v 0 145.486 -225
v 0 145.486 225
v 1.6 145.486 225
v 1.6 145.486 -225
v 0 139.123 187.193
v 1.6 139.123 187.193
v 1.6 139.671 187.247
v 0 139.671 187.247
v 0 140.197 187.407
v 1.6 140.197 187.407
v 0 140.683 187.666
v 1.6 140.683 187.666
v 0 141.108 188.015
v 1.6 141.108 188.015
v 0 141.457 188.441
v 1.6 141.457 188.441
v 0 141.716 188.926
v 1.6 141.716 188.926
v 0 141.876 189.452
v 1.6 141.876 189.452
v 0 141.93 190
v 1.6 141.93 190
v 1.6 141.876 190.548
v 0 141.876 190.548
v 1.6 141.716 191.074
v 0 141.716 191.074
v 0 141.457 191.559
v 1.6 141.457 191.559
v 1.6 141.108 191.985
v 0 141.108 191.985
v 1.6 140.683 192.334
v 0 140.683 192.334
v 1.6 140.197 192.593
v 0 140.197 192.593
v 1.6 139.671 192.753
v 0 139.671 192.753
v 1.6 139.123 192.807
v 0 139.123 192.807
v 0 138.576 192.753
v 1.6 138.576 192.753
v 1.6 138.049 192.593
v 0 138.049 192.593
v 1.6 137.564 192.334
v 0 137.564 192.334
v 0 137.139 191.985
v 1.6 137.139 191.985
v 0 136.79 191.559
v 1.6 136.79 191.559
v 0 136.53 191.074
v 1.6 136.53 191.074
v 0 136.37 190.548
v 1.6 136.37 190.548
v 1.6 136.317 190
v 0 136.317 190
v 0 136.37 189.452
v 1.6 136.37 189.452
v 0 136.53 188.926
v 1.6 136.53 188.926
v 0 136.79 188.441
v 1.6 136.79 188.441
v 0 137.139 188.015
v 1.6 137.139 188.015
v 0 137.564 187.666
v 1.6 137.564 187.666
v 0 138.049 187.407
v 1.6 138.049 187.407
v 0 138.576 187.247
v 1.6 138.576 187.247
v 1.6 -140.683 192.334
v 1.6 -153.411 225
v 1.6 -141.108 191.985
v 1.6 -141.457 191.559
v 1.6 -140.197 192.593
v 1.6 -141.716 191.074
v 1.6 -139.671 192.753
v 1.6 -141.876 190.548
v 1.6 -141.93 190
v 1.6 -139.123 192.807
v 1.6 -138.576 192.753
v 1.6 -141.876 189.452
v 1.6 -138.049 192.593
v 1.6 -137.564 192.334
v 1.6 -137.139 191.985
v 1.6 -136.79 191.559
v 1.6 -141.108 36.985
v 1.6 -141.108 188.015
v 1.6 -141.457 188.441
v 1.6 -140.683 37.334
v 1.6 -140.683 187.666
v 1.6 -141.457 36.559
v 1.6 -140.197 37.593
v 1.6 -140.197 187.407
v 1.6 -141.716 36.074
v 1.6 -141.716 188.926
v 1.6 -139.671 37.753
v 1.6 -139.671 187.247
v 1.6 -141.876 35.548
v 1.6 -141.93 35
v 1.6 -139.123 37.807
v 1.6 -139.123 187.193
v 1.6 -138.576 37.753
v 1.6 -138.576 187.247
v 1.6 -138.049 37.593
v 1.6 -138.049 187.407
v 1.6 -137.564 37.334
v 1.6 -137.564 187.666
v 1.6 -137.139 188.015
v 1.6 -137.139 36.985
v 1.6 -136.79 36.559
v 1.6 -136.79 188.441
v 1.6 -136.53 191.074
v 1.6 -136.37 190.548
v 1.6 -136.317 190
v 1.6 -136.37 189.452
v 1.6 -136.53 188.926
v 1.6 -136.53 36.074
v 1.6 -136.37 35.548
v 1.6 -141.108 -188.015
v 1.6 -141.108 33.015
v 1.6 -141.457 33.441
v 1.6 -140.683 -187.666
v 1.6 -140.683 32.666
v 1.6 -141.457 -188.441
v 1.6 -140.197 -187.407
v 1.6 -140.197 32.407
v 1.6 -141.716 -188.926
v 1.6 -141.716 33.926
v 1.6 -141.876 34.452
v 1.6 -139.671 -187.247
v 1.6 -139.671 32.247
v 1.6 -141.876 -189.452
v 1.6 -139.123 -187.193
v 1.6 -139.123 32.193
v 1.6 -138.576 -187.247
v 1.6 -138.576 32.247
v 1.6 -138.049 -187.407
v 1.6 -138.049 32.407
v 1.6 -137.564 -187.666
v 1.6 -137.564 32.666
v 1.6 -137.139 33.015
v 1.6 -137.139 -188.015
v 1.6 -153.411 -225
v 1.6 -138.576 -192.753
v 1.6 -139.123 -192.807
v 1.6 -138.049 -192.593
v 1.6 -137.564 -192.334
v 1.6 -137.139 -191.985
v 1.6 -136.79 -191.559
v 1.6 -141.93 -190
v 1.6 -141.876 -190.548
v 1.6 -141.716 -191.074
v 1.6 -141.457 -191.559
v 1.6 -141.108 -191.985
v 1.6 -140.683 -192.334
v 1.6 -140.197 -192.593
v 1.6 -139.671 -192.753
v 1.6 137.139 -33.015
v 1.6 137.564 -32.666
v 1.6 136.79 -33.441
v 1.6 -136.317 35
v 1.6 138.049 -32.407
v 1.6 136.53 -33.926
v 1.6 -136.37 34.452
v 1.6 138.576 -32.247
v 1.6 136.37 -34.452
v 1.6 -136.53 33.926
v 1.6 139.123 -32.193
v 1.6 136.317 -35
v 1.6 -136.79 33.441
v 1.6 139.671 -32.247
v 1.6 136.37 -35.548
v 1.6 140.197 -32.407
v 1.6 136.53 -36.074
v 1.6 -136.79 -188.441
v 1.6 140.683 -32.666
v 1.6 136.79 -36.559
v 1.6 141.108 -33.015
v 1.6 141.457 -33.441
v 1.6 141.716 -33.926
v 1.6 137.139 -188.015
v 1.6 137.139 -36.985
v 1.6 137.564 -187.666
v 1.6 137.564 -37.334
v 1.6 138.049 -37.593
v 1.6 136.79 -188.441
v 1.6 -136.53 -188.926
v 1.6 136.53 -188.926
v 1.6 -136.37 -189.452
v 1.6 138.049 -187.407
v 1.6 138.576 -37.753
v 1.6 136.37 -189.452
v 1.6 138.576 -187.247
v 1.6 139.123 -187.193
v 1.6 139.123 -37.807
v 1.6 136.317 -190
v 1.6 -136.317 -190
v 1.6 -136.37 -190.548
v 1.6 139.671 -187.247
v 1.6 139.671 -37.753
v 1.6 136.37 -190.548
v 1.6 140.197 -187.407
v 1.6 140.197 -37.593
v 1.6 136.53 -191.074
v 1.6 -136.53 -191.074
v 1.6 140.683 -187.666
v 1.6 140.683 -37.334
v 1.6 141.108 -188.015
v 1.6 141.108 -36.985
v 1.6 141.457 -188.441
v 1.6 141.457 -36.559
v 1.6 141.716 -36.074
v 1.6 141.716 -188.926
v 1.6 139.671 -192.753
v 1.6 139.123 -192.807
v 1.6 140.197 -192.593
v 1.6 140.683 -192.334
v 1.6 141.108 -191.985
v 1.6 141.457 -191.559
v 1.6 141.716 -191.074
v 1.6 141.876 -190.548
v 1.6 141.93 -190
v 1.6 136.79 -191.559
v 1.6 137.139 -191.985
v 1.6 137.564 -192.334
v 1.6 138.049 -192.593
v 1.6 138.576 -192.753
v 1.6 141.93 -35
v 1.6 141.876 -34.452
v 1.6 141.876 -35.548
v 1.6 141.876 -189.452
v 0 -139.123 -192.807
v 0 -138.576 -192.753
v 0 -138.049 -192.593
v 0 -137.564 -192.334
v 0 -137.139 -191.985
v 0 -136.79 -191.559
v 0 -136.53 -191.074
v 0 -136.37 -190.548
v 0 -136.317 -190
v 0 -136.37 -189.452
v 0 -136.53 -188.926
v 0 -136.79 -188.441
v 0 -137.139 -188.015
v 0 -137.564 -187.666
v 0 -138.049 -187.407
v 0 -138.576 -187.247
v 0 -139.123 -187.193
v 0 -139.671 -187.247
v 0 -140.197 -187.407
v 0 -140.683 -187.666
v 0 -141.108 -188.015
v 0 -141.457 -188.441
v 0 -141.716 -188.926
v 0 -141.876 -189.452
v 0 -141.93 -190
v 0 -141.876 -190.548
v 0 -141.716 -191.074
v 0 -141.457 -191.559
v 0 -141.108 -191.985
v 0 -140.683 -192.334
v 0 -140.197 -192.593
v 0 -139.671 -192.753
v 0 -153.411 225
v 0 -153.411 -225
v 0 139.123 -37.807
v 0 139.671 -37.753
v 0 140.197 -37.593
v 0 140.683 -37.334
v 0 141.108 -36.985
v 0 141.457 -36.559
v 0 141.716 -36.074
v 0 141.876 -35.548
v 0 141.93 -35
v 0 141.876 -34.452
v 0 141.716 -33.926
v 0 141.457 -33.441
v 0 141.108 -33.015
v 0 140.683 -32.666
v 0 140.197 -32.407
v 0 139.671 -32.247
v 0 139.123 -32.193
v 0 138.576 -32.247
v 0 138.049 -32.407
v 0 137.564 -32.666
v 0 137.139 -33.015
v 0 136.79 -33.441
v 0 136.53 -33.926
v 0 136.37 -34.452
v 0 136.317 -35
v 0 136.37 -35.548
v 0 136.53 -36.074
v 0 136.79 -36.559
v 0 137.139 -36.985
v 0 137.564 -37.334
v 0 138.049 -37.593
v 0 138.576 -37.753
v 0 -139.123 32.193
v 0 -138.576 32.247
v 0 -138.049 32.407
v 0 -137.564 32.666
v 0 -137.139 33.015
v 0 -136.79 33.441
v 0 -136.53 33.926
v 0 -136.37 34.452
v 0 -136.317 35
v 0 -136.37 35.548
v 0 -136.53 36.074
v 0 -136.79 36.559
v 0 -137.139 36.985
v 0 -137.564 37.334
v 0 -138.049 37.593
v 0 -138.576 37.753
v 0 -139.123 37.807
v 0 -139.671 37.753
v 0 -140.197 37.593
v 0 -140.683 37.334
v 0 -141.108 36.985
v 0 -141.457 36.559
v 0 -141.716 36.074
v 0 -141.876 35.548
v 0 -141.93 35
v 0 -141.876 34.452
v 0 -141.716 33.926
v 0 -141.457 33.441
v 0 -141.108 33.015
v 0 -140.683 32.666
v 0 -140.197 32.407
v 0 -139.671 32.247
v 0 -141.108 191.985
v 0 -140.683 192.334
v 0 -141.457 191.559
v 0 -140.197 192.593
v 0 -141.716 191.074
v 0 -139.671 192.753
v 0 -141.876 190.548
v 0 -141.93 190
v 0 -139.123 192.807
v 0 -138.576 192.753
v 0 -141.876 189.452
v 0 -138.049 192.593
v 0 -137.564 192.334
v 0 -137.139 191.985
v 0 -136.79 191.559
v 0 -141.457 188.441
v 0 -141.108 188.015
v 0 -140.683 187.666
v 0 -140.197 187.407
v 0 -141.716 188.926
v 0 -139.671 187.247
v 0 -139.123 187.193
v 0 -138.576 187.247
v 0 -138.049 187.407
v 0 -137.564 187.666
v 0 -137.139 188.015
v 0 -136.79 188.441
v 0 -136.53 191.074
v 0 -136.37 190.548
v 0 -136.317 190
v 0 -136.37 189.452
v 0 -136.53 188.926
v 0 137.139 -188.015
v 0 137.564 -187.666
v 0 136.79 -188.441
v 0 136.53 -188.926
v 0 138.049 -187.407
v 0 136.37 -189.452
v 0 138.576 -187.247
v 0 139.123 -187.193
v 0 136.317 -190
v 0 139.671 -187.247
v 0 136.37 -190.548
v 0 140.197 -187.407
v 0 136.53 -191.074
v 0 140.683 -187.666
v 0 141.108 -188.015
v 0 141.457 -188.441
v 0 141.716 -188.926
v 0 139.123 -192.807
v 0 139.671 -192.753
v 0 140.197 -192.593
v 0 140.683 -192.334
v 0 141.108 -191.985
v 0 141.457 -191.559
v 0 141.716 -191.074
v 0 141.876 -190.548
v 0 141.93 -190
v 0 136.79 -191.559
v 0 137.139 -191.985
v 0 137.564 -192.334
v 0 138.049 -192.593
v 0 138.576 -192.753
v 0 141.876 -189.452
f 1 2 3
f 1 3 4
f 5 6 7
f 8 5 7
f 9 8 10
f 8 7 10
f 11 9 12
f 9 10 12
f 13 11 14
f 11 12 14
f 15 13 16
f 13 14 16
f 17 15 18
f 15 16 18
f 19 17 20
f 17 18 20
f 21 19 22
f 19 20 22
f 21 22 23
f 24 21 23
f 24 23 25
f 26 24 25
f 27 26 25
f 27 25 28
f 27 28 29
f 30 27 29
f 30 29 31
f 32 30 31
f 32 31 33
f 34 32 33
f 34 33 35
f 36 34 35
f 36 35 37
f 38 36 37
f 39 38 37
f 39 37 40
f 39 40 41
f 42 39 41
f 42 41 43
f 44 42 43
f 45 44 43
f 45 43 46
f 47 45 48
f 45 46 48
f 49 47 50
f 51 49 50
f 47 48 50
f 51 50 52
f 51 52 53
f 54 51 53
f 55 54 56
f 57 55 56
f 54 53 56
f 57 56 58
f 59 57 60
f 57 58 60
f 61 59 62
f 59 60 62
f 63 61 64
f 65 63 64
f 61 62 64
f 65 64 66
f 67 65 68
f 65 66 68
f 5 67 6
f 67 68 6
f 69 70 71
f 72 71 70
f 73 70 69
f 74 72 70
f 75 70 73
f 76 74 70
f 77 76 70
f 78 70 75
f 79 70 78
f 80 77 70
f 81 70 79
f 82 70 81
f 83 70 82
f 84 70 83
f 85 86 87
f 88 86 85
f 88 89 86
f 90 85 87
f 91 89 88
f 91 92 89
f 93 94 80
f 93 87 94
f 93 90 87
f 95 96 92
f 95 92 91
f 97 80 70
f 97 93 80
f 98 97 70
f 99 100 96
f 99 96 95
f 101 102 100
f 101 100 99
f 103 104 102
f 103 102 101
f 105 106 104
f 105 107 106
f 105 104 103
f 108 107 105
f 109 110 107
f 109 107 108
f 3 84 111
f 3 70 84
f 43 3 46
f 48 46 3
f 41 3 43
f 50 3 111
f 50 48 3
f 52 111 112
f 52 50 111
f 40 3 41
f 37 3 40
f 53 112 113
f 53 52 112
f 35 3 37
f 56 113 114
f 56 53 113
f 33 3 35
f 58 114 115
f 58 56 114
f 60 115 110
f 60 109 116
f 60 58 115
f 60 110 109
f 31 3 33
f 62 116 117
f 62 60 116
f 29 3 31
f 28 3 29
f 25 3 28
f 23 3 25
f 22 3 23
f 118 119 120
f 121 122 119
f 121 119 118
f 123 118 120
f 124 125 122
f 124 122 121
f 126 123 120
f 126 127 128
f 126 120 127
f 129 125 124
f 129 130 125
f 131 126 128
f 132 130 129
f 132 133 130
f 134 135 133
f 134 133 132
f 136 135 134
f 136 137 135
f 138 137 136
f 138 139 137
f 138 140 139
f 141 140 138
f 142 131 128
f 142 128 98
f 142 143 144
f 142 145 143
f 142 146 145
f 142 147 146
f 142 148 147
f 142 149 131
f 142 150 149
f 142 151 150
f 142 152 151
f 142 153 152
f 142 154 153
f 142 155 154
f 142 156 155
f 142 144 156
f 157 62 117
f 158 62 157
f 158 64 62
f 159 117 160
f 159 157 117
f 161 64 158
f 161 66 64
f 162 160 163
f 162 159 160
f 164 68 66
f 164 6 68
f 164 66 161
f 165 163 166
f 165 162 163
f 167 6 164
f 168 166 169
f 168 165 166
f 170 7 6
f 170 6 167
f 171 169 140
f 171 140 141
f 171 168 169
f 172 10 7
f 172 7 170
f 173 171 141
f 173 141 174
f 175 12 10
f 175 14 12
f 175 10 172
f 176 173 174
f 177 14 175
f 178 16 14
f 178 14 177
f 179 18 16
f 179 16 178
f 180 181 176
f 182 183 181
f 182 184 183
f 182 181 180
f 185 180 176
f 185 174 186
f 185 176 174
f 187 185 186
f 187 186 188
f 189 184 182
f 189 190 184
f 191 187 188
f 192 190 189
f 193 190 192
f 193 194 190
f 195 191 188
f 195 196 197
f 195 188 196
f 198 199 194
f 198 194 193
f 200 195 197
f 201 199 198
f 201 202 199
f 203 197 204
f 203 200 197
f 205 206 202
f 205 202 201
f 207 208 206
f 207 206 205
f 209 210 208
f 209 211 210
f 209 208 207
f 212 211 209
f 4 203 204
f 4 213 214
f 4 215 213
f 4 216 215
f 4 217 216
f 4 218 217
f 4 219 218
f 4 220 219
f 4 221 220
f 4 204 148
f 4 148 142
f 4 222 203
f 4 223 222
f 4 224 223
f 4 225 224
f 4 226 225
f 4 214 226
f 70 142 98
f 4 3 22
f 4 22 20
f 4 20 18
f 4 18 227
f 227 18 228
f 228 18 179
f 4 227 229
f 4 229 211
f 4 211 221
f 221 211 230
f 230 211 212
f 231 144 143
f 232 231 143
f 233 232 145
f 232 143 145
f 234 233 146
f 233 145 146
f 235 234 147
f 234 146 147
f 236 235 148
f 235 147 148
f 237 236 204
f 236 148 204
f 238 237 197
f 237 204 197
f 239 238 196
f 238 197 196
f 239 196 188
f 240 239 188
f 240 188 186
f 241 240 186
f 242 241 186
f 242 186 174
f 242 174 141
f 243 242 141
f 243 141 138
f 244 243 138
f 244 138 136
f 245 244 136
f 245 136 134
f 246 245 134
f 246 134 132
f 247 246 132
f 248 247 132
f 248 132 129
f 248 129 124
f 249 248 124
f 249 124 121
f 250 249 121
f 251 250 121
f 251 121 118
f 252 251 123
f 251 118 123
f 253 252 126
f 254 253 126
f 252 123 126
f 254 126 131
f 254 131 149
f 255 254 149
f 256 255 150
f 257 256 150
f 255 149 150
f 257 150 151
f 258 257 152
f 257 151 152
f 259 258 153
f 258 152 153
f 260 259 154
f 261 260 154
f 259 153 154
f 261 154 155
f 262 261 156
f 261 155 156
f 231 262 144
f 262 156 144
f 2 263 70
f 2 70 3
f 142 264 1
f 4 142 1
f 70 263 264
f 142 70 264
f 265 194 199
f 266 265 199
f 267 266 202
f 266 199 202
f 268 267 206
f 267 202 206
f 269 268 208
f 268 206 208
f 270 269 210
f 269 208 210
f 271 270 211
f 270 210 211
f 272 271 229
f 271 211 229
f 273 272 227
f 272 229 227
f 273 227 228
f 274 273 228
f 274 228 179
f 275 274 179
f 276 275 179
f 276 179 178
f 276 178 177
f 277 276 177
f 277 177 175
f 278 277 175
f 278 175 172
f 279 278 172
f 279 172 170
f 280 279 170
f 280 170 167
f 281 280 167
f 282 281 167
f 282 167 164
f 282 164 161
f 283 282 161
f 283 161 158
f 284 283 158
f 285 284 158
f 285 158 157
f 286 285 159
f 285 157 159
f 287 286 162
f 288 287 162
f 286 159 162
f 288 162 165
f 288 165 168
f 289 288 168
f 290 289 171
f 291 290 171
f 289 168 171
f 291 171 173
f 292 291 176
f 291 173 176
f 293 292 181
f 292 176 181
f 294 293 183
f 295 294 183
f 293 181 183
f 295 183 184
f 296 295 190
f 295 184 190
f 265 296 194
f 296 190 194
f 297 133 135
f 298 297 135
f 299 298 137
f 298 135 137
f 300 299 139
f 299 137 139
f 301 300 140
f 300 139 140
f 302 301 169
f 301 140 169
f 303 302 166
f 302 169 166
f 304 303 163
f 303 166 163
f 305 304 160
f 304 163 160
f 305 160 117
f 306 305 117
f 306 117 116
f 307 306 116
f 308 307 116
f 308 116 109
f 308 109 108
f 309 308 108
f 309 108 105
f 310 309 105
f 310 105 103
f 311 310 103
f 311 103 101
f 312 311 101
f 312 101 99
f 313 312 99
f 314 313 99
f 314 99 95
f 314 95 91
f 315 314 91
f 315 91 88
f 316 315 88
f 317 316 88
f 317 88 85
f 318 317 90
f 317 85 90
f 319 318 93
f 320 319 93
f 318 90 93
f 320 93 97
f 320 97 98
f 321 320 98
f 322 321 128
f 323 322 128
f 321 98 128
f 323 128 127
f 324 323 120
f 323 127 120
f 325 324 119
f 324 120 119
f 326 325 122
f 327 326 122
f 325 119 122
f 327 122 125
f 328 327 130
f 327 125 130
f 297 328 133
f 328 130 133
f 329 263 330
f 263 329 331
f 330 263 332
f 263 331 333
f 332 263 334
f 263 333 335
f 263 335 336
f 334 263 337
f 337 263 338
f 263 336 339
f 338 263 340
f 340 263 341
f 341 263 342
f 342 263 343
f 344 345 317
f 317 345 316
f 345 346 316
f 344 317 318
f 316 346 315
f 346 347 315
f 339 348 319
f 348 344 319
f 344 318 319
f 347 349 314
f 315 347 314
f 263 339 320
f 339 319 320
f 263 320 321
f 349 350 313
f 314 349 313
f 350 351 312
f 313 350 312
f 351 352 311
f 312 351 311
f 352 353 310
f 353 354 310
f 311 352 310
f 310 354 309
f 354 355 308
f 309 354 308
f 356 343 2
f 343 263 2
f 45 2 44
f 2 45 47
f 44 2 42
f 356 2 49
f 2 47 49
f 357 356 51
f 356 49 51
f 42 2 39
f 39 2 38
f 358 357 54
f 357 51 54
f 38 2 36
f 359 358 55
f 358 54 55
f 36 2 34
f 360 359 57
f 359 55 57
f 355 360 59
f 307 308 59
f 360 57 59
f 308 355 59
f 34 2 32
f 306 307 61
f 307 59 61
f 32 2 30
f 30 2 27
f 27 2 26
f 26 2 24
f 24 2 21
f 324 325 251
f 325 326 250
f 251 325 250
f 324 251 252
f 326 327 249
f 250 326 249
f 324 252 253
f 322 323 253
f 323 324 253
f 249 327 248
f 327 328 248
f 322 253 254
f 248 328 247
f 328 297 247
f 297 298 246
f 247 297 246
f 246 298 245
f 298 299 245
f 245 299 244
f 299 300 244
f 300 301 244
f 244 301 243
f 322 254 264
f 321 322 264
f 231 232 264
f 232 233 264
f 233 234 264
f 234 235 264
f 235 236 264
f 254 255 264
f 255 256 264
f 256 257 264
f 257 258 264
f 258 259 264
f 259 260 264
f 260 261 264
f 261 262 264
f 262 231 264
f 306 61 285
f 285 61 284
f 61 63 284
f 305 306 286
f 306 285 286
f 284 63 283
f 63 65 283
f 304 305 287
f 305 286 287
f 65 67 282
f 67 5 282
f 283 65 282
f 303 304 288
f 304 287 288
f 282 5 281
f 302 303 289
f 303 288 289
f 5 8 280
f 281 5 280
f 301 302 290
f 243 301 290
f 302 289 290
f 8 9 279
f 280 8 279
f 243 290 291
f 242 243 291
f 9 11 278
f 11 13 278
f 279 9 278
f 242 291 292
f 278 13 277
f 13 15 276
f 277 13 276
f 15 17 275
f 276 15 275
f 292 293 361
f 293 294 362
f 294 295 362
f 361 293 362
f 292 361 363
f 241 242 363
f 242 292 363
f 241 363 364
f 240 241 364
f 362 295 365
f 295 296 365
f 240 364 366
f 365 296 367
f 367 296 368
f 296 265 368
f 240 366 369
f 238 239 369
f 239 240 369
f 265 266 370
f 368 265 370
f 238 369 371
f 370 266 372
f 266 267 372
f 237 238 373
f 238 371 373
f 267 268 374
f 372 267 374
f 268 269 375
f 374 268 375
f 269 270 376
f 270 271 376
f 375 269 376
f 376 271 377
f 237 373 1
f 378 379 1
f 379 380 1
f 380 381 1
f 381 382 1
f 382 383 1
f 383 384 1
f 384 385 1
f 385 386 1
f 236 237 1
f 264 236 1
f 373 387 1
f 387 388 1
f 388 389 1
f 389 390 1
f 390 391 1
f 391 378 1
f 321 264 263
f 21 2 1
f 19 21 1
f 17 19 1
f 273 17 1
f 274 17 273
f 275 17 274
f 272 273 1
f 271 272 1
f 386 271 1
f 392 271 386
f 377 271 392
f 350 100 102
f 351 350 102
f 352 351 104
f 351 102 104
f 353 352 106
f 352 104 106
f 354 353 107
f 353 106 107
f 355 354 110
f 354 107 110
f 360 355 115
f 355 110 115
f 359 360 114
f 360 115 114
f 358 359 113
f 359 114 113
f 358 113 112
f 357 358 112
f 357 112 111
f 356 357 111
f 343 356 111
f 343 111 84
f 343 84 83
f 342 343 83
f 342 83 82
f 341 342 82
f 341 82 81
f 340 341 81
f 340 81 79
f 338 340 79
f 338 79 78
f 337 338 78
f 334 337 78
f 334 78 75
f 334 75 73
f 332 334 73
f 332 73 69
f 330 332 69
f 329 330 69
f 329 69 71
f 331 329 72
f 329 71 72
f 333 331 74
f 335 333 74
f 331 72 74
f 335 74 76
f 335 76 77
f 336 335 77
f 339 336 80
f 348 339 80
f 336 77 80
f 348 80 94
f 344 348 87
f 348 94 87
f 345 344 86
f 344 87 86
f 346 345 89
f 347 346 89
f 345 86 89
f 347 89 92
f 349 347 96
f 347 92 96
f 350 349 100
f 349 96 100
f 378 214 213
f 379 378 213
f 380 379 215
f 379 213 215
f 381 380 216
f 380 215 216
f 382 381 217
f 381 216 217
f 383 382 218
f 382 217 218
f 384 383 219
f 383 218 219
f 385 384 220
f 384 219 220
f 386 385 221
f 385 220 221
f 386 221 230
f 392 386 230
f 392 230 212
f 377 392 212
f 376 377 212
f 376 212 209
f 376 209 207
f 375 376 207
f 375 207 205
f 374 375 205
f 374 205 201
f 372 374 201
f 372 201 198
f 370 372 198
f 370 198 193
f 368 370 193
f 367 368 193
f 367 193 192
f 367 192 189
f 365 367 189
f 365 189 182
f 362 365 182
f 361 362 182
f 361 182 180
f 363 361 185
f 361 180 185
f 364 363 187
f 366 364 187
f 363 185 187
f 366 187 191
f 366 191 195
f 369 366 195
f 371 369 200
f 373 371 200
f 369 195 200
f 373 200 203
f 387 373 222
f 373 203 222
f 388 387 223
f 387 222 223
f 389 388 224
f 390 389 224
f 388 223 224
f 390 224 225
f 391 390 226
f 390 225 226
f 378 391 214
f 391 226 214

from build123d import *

# Parameters (mm, degrees)
SKETCH2_W                  = 450
SKETCH2_H                  = 298.8966167
BOSS_EXTRUDE1_DEPTH        = 1.6002
F_10_CLEARANCE_HOLE1_D     = 5.6134
F_10_CLEARANCE_HOLE1_DEPTH = 20
F_10_CLEARANCE_HOLE1_TIP   = 1.686435499


with BuildPart() as part:
    # Sketch2 → Boss-Extrude1 (new body)
    with BuildSketch(Plane(origin=(0, 0, 0), x_dir=(0, 0, -1), z_dir=(1, 0, 0))):
        with Locations((0, -3.9624)):
            Rectangle(SKETCH2_W, SKETCH2_H)
    extrude(amount=BOSS_EXTRUDE1_DEPTH)

    # #10 Clearance Hole1
    with Locations(Plane.ZY):
        with Locations((-190, 139.12320835), (-35, 139.12320835), (190, 139.12320835), (190, -139.12320835), (35, -139.12320835), (-190, -139.12320835)):
            Hole(F_10_CLEARANCE_HOLE1_D / 2, depth=F_10_CLEARANCE_HOLE1_DEPTH)
            with Locations((0, 0, -(F_10_CLEARANCE_HOLE1_DEPTH + F_10_CLEARANCE_HOLE1_TIP / 2))):  # 118° drill point
                Cone(0, F_10_CLEARANCE_HOLE1_D / 2, F_10_CLEARANCE_HOLE1_TIP, mode=Mode.SUBTRACT)


solid = part.part
